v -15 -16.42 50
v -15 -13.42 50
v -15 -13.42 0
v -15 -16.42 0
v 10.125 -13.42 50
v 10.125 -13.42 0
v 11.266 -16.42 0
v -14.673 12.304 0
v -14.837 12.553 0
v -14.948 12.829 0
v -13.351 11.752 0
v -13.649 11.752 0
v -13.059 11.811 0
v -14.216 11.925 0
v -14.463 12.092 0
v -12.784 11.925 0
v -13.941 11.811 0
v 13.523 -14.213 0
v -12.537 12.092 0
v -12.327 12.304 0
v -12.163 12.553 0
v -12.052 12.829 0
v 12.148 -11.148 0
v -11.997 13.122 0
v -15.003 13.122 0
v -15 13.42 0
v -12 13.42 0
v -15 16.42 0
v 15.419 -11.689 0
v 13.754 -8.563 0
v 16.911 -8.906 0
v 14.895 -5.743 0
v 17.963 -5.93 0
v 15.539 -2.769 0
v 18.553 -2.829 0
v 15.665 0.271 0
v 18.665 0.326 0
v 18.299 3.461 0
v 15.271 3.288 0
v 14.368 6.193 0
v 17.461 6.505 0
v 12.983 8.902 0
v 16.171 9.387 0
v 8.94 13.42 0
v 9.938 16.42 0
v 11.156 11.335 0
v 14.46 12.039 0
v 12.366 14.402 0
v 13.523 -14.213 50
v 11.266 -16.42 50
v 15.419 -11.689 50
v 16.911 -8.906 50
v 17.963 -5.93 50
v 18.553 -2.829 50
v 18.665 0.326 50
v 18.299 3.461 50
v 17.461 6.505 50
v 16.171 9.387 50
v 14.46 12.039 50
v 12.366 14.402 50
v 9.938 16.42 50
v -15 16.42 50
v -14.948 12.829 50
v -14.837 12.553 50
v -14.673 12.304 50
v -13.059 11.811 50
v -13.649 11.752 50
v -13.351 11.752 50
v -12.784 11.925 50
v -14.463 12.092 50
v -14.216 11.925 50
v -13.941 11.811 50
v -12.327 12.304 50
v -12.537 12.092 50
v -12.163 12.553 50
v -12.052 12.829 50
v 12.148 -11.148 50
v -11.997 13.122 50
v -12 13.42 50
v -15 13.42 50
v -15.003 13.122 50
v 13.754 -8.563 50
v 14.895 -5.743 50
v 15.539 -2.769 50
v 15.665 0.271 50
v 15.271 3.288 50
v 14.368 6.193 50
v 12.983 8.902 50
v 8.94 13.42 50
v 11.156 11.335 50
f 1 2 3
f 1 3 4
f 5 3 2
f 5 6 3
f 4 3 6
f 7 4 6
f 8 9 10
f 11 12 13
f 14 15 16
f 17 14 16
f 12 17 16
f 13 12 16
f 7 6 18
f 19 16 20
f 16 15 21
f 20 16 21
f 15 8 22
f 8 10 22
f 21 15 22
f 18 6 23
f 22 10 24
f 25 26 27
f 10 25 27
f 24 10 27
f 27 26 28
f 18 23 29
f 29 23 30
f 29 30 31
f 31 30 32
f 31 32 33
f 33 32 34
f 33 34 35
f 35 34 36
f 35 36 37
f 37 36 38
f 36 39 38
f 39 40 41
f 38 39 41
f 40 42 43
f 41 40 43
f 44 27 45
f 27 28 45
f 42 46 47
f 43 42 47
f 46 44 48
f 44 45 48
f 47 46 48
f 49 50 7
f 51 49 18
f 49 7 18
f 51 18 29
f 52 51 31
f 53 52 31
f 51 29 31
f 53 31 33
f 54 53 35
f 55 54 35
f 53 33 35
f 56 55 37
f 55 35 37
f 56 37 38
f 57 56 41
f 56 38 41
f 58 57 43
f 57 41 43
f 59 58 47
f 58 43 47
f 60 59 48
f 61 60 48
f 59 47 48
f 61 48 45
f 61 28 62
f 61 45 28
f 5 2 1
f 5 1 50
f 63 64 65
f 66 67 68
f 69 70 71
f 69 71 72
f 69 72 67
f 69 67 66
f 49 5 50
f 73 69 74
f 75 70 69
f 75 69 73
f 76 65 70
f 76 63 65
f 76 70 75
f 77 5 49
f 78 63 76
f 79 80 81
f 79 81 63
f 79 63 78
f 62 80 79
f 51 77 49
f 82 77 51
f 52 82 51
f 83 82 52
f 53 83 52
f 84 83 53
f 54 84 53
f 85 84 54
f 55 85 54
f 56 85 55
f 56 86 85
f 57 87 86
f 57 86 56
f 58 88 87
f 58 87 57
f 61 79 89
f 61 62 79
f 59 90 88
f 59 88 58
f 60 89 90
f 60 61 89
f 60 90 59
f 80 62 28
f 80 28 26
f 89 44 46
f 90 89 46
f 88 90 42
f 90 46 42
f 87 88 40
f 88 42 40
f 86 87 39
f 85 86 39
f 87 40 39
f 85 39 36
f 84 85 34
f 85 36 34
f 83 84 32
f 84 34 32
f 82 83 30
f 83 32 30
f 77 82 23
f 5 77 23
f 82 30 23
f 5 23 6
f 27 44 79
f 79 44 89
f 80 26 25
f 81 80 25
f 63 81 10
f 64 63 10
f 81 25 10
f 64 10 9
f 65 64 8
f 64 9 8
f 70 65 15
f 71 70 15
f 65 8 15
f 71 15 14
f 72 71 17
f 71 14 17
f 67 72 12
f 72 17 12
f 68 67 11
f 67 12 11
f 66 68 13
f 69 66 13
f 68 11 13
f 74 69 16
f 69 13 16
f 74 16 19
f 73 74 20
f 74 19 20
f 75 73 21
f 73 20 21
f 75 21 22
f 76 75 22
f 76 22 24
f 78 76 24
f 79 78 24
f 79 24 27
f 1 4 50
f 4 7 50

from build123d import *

# Parameters (mm, degrees)
F1_DEPTH = 50
F2_W     = 3
F2_H     = 50
F3_DEPTH = 15
F4_W     = 3
F4_H     = 50
F5_DEPTH = 15
F9_DEPTH = 50


with BuildPart() as f1:
    # F0 (on Top) → F1 (new body)
    with BuildSketch(Plane.XY):
        with BuildLine():
            Line((0, 13.42), (8.94, 13.42))
            ThreePointArc((8.94, 13.42), (15.665114, 0.270758), (10.125, -13.42))
            Line((10.125, -13.42), (0, -13.42))
            Line((0, -13.42), (0, -16.42))
            Line((0, -16.42), (11.265835, -16.42))
            ThreePointArc((11.265835, -16.42), (18.665454, 0.325994), (9.93816, 16.42))
            Line((9.93816, 16.42), (0, 16.42))
            Line((0, 16.42), (0, 13.42))
        make_face()
    extrude(amount=F1_DEPTH)

    # F2 (on face) → F3 (join)
    with BuildSketch(Plane(origin=(0, 0, 0), x_dir=(0, -1, 0), z_dir=(-1, 0, 0))):
        with Locations((-14.92, 25)):
            Rectangle(F2_W, F2_H)
    extrude(amount=F3_DEPTH)

    # F4 (on face) → F5 (join)
    with BuildSketch(Plane(origin=(0, 0, 0), x_dir=(0, -1, 0), z_dir=(-1, 0, 0))):
        with Locations((14.92, 25)):
            Rectangle(F4_W, F4_H)
    extrude(amount=F5_DEPTH)

    # F8 (on Top) → F9 (join)
    with BuildSketch(Plane.XY):
        with BuildLine():
            Line((-12, 13.42), (-15, 13.42))
            ThreePointArc((-15, 13.42), (-13.5, 11.744685), (-12, 13.42))
        make_face()
    extrude(amount=F9_DEPTH)


solid = f1.part
